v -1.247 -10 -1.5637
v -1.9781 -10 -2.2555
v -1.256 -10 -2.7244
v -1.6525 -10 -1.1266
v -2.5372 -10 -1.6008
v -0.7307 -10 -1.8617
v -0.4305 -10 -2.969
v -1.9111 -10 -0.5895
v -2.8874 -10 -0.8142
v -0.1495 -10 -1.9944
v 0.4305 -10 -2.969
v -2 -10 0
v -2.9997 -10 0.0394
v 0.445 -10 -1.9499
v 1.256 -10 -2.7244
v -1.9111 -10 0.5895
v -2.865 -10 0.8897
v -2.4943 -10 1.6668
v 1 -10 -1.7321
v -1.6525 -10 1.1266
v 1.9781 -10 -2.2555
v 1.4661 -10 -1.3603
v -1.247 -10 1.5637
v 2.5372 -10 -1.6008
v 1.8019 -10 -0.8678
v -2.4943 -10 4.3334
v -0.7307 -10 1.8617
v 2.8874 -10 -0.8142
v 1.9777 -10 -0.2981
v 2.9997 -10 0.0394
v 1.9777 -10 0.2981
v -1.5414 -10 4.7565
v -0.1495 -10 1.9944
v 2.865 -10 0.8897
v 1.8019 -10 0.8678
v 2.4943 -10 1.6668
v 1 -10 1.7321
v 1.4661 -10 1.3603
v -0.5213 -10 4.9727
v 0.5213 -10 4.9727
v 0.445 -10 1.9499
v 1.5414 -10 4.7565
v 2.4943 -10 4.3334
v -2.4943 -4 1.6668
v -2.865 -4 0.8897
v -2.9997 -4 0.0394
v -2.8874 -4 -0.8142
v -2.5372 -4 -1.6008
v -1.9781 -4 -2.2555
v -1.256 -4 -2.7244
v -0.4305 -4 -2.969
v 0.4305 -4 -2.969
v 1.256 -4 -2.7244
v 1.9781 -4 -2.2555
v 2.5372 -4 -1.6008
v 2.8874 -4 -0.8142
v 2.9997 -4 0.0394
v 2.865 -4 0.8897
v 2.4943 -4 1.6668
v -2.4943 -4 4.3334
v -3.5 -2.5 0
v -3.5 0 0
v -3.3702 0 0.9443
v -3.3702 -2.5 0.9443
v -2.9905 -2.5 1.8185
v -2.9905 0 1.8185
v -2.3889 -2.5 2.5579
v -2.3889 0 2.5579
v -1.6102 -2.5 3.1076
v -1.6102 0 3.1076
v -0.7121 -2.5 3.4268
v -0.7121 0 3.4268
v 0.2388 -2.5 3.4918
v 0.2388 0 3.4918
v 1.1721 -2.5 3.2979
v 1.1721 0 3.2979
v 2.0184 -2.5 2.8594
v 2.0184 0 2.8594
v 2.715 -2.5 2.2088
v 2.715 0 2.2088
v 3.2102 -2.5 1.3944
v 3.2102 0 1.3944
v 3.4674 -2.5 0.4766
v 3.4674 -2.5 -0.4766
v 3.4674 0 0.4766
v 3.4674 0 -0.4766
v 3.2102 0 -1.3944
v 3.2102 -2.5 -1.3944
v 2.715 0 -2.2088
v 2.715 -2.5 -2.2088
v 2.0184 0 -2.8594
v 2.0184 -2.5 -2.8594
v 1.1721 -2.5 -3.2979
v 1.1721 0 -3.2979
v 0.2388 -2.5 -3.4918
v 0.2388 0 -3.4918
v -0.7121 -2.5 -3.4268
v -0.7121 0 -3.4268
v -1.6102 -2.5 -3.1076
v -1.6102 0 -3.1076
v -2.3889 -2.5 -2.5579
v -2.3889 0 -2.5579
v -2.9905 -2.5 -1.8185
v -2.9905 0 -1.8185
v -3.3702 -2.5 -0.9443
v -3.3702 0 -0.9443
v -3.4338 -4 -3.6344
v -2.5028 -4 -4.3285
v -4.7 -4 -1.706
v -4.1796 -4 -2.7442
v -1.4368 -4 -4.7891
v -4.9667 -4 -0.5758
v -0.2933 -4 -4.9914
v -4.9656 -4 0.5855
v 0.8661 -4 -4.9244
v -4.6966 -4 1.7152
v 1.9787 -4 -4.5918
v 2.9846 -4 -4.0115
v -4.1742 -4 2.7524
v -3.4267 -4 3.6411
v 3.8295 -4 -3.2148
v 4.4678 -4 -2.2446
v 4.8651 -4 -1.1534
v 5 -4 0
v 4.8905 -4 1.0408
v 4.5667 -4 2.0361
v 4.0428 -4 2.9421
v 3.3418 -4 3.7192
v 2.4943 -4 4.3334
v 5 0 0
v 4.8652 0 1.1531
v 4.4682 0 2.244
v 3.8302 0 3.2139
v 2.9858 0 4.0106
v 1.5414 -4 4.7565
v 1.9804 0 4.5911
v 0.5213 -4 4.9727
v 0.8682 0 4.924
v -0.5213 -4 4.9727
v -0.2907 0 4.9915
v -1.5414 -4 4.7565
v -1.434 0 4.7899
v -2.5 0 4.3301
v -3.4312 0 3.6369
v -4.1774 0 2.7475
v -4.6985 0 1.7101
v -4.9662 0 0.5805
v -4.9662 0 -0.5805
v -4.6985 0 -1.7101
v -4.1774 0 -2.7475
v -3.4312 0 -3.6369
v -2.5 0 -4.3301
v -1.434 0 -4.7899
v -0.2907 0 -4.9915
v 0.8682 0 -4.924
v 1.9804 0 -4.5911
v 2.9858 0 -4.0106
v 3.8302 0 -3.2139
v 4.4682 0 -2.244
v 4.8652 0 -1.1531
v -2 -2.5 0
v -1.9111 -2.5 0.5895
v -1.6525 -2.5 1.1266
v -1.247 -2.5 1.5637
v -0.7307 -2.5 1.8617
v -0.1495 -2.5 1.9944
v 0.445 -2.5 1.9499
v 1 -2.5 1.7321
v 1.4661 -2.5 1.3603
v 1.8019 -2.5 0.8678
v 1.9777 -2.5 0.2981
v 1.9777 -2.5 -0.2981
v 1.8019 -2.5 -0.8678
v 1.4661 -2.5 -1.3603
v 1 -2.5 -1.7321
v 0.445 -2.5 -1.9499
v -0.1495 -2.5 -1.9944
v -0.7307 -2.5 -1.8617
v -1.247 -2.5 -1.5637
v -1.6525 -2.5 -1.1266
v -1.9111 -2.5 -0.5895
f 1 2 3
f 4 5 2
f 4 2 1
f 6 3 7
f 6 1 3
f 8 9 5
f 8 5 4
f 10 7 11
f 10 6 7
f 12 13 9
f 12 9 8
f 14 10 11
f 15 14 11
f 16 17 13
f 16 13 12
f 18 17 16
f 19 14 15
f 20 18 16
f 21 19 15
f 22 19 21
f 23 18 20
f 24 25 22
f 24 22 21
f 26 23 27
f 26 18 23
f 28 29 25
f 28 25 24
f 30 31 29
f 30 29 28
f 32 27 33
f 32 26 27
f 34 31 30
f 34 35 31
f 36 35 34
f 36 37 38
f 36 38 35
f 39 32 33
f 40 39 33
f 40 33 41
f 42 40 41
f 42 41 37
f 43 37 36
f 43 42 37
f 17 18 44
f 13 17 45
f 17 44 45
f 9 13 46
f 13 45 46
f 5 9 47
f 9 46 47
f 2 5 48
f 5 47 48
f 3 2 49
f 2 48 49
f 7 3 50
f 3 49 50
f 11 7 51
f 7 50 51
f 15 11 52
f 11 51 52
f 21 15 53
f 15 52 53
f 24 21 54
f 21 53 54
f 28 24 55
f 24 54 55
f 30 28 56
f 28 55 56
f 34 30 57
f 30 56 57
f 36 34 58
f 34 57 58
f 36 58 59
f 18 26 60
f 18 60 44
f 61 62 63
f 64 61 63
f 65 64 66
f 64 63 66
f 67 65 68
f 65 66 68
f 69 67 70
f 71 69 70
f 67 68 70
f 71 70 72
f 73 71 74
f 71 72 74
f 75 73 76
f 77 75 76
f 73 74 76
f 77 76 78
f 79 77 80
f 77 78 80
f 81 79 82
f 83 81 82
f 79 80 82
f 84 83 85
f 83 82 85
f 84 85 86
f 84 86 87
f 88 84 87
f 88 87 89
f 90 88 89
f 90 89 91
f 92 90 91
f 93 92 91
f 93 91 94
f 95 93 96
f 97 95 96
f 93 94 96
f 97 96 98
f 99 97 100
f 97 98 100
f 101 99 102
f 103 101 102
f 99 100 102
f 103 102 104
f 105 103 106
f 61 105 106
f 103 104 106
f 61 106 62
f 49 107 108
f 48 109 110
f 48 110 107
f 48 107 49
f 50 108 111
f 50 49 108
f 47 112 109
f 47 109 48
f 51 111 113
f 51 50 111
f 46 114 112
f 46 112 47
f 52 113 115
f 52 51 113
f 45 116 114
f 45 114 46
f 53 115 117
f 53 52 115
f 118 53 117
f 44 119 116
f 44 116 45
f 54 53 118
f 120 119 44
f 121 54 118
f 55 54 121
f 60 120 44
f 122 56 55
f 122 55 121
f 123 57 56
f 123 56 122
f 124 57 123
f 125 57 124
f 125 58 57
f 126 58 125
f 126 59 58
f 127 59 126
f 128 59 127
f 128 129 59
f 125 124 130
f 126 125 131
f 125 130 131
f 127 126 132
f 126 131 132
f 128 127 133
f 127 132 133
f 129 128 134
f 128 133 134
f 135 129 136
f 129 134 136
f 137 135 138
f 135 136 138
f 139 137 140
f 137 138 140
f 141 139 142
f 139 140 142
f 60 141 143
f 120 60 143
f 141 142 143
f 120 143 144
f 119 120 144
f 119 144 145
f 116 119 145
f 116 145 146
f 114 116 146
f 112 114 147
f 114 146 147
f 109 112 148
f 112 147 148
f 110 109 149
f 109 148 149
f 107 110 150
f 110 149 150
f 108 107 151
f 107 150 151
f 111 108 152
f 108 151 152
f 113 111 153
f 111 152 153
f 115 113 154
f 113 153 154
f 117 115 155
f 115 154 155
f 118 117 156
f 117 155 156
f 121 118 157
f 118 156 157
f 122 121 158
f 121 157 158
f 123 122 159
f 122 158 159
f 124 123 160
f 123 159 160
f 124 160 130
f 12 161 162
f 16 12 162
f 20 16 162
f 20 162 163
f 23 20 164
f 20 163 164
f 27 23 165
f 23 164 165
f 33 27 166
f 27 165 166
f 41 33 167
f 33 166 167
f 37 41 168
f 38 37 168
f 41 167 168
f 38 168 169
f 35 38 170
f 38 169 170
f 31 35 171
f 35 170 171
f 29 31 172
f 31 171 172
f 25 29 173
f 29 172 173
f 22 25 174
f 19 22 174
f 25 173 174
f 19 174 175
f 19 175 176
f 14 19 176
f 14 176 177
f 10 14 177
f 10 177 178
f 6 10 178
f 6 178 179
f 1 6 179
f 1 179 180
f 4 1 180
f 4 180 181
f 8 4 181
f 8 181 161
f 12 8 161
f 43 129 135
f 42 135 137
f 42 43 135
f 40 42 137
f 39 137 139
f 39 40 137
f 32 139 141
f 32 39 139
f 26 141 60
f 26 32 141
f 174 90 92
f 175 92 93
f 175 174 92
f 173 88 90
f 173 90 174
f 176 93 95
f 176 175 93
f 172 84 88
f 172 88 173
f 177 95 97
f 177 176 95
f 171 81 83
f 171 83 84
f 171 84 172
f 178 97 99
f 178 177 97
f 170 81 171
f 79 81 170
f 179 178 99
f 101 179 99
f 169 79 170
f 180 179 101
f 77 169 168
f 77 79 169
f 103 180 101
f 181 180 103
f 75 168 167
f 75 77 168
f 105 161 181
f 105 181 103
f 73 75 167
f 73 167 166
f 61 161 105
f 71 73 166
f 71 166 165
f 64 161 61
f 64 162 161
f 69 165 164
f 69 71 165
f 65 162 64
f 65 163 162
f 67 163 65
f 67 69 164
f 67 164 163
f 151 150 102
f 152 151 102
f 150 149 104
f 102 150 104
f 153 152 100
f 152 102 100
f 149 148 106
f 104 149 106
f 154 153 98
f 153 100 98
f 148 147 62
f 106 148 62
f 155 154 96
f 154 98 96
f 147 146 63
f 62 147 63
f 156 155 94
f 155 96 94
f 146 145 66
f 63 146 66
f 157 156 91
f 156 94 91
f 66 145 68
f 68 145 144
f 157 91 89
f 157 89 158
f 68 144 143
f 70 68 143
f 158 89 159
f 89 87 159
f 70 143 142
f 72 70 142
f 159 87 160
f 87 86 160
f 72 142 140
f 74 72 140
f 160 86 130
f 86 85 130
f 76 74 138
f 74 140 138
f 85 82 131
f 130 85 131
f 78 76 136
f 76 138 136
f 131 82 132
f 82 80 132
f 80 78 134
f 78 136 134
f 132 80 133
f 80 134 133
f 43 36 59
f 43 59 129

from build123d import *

# Parameters (mm, degrees)
F0_R     = 5
F1_DEPTH = 4
F2_R     = 3
F3_DEPTH = 6
F4_R     = 2
F5_DEPTH = 25
F4_R_2   = 3.5
F6_DEPTH = 2.5
F8_DEPTH = 7


with BuildPart() as f1:
    # F0 (on Front) → F1 (new body)
    with BuildSketch(Plane.XZ):
        Circle(F0_R)
    extrude(amount=F1_DEPTH)

    # F2 (on face) → F3 (join)
    with BuildSketch(Plane.XZ.offset(4)):
        Circle(F2_R)
    extrude(amount=F3_DEPTH)

    # F4 (on face) → F5 (cut)
    with BuildSketch(Plane(origin=(0, 0, 0), x_dir=(-1, 0, 0), z_dir=(0, 1, 0))):
        Circle(F4_R)
    extrude(amount=-F5_DEPTH, mode=Mode.SUBTRACT)

    # F4 (on face) → F6 (cut)
    with BuildSketch(Plane(origin=(0, 0, 0), x_dir=(-1, 0, 0), z_dir=(0, 1, 0))):
        Circle(F4_R_2)
        Circle(F4_R, mode=Mode.SUBTRACT)
    extrude(amount=-F6_DEPTH, mode=Mode.SUBTRACT)

    # F7 (on face) → F8 (join)
    with BuildSketch(Plane.XZ.offset(10)):
        with BuildLine():
            Line((2.49434, 1.666814), (2.49434, 4.33339))
            ThreePointArc((2.49434, 4.33339), (0, 5), (-2.49434, 4.33339))
            Line((-2.49434, 4.33339), (-2.49434, 1.666814))
            ThreePointArc((-2.49434, 1.666814), (0, 3), (2.49434, 1.666814))
        make_face()
    extrude(amount=-F8_DEPTH)


solid = f1.part
